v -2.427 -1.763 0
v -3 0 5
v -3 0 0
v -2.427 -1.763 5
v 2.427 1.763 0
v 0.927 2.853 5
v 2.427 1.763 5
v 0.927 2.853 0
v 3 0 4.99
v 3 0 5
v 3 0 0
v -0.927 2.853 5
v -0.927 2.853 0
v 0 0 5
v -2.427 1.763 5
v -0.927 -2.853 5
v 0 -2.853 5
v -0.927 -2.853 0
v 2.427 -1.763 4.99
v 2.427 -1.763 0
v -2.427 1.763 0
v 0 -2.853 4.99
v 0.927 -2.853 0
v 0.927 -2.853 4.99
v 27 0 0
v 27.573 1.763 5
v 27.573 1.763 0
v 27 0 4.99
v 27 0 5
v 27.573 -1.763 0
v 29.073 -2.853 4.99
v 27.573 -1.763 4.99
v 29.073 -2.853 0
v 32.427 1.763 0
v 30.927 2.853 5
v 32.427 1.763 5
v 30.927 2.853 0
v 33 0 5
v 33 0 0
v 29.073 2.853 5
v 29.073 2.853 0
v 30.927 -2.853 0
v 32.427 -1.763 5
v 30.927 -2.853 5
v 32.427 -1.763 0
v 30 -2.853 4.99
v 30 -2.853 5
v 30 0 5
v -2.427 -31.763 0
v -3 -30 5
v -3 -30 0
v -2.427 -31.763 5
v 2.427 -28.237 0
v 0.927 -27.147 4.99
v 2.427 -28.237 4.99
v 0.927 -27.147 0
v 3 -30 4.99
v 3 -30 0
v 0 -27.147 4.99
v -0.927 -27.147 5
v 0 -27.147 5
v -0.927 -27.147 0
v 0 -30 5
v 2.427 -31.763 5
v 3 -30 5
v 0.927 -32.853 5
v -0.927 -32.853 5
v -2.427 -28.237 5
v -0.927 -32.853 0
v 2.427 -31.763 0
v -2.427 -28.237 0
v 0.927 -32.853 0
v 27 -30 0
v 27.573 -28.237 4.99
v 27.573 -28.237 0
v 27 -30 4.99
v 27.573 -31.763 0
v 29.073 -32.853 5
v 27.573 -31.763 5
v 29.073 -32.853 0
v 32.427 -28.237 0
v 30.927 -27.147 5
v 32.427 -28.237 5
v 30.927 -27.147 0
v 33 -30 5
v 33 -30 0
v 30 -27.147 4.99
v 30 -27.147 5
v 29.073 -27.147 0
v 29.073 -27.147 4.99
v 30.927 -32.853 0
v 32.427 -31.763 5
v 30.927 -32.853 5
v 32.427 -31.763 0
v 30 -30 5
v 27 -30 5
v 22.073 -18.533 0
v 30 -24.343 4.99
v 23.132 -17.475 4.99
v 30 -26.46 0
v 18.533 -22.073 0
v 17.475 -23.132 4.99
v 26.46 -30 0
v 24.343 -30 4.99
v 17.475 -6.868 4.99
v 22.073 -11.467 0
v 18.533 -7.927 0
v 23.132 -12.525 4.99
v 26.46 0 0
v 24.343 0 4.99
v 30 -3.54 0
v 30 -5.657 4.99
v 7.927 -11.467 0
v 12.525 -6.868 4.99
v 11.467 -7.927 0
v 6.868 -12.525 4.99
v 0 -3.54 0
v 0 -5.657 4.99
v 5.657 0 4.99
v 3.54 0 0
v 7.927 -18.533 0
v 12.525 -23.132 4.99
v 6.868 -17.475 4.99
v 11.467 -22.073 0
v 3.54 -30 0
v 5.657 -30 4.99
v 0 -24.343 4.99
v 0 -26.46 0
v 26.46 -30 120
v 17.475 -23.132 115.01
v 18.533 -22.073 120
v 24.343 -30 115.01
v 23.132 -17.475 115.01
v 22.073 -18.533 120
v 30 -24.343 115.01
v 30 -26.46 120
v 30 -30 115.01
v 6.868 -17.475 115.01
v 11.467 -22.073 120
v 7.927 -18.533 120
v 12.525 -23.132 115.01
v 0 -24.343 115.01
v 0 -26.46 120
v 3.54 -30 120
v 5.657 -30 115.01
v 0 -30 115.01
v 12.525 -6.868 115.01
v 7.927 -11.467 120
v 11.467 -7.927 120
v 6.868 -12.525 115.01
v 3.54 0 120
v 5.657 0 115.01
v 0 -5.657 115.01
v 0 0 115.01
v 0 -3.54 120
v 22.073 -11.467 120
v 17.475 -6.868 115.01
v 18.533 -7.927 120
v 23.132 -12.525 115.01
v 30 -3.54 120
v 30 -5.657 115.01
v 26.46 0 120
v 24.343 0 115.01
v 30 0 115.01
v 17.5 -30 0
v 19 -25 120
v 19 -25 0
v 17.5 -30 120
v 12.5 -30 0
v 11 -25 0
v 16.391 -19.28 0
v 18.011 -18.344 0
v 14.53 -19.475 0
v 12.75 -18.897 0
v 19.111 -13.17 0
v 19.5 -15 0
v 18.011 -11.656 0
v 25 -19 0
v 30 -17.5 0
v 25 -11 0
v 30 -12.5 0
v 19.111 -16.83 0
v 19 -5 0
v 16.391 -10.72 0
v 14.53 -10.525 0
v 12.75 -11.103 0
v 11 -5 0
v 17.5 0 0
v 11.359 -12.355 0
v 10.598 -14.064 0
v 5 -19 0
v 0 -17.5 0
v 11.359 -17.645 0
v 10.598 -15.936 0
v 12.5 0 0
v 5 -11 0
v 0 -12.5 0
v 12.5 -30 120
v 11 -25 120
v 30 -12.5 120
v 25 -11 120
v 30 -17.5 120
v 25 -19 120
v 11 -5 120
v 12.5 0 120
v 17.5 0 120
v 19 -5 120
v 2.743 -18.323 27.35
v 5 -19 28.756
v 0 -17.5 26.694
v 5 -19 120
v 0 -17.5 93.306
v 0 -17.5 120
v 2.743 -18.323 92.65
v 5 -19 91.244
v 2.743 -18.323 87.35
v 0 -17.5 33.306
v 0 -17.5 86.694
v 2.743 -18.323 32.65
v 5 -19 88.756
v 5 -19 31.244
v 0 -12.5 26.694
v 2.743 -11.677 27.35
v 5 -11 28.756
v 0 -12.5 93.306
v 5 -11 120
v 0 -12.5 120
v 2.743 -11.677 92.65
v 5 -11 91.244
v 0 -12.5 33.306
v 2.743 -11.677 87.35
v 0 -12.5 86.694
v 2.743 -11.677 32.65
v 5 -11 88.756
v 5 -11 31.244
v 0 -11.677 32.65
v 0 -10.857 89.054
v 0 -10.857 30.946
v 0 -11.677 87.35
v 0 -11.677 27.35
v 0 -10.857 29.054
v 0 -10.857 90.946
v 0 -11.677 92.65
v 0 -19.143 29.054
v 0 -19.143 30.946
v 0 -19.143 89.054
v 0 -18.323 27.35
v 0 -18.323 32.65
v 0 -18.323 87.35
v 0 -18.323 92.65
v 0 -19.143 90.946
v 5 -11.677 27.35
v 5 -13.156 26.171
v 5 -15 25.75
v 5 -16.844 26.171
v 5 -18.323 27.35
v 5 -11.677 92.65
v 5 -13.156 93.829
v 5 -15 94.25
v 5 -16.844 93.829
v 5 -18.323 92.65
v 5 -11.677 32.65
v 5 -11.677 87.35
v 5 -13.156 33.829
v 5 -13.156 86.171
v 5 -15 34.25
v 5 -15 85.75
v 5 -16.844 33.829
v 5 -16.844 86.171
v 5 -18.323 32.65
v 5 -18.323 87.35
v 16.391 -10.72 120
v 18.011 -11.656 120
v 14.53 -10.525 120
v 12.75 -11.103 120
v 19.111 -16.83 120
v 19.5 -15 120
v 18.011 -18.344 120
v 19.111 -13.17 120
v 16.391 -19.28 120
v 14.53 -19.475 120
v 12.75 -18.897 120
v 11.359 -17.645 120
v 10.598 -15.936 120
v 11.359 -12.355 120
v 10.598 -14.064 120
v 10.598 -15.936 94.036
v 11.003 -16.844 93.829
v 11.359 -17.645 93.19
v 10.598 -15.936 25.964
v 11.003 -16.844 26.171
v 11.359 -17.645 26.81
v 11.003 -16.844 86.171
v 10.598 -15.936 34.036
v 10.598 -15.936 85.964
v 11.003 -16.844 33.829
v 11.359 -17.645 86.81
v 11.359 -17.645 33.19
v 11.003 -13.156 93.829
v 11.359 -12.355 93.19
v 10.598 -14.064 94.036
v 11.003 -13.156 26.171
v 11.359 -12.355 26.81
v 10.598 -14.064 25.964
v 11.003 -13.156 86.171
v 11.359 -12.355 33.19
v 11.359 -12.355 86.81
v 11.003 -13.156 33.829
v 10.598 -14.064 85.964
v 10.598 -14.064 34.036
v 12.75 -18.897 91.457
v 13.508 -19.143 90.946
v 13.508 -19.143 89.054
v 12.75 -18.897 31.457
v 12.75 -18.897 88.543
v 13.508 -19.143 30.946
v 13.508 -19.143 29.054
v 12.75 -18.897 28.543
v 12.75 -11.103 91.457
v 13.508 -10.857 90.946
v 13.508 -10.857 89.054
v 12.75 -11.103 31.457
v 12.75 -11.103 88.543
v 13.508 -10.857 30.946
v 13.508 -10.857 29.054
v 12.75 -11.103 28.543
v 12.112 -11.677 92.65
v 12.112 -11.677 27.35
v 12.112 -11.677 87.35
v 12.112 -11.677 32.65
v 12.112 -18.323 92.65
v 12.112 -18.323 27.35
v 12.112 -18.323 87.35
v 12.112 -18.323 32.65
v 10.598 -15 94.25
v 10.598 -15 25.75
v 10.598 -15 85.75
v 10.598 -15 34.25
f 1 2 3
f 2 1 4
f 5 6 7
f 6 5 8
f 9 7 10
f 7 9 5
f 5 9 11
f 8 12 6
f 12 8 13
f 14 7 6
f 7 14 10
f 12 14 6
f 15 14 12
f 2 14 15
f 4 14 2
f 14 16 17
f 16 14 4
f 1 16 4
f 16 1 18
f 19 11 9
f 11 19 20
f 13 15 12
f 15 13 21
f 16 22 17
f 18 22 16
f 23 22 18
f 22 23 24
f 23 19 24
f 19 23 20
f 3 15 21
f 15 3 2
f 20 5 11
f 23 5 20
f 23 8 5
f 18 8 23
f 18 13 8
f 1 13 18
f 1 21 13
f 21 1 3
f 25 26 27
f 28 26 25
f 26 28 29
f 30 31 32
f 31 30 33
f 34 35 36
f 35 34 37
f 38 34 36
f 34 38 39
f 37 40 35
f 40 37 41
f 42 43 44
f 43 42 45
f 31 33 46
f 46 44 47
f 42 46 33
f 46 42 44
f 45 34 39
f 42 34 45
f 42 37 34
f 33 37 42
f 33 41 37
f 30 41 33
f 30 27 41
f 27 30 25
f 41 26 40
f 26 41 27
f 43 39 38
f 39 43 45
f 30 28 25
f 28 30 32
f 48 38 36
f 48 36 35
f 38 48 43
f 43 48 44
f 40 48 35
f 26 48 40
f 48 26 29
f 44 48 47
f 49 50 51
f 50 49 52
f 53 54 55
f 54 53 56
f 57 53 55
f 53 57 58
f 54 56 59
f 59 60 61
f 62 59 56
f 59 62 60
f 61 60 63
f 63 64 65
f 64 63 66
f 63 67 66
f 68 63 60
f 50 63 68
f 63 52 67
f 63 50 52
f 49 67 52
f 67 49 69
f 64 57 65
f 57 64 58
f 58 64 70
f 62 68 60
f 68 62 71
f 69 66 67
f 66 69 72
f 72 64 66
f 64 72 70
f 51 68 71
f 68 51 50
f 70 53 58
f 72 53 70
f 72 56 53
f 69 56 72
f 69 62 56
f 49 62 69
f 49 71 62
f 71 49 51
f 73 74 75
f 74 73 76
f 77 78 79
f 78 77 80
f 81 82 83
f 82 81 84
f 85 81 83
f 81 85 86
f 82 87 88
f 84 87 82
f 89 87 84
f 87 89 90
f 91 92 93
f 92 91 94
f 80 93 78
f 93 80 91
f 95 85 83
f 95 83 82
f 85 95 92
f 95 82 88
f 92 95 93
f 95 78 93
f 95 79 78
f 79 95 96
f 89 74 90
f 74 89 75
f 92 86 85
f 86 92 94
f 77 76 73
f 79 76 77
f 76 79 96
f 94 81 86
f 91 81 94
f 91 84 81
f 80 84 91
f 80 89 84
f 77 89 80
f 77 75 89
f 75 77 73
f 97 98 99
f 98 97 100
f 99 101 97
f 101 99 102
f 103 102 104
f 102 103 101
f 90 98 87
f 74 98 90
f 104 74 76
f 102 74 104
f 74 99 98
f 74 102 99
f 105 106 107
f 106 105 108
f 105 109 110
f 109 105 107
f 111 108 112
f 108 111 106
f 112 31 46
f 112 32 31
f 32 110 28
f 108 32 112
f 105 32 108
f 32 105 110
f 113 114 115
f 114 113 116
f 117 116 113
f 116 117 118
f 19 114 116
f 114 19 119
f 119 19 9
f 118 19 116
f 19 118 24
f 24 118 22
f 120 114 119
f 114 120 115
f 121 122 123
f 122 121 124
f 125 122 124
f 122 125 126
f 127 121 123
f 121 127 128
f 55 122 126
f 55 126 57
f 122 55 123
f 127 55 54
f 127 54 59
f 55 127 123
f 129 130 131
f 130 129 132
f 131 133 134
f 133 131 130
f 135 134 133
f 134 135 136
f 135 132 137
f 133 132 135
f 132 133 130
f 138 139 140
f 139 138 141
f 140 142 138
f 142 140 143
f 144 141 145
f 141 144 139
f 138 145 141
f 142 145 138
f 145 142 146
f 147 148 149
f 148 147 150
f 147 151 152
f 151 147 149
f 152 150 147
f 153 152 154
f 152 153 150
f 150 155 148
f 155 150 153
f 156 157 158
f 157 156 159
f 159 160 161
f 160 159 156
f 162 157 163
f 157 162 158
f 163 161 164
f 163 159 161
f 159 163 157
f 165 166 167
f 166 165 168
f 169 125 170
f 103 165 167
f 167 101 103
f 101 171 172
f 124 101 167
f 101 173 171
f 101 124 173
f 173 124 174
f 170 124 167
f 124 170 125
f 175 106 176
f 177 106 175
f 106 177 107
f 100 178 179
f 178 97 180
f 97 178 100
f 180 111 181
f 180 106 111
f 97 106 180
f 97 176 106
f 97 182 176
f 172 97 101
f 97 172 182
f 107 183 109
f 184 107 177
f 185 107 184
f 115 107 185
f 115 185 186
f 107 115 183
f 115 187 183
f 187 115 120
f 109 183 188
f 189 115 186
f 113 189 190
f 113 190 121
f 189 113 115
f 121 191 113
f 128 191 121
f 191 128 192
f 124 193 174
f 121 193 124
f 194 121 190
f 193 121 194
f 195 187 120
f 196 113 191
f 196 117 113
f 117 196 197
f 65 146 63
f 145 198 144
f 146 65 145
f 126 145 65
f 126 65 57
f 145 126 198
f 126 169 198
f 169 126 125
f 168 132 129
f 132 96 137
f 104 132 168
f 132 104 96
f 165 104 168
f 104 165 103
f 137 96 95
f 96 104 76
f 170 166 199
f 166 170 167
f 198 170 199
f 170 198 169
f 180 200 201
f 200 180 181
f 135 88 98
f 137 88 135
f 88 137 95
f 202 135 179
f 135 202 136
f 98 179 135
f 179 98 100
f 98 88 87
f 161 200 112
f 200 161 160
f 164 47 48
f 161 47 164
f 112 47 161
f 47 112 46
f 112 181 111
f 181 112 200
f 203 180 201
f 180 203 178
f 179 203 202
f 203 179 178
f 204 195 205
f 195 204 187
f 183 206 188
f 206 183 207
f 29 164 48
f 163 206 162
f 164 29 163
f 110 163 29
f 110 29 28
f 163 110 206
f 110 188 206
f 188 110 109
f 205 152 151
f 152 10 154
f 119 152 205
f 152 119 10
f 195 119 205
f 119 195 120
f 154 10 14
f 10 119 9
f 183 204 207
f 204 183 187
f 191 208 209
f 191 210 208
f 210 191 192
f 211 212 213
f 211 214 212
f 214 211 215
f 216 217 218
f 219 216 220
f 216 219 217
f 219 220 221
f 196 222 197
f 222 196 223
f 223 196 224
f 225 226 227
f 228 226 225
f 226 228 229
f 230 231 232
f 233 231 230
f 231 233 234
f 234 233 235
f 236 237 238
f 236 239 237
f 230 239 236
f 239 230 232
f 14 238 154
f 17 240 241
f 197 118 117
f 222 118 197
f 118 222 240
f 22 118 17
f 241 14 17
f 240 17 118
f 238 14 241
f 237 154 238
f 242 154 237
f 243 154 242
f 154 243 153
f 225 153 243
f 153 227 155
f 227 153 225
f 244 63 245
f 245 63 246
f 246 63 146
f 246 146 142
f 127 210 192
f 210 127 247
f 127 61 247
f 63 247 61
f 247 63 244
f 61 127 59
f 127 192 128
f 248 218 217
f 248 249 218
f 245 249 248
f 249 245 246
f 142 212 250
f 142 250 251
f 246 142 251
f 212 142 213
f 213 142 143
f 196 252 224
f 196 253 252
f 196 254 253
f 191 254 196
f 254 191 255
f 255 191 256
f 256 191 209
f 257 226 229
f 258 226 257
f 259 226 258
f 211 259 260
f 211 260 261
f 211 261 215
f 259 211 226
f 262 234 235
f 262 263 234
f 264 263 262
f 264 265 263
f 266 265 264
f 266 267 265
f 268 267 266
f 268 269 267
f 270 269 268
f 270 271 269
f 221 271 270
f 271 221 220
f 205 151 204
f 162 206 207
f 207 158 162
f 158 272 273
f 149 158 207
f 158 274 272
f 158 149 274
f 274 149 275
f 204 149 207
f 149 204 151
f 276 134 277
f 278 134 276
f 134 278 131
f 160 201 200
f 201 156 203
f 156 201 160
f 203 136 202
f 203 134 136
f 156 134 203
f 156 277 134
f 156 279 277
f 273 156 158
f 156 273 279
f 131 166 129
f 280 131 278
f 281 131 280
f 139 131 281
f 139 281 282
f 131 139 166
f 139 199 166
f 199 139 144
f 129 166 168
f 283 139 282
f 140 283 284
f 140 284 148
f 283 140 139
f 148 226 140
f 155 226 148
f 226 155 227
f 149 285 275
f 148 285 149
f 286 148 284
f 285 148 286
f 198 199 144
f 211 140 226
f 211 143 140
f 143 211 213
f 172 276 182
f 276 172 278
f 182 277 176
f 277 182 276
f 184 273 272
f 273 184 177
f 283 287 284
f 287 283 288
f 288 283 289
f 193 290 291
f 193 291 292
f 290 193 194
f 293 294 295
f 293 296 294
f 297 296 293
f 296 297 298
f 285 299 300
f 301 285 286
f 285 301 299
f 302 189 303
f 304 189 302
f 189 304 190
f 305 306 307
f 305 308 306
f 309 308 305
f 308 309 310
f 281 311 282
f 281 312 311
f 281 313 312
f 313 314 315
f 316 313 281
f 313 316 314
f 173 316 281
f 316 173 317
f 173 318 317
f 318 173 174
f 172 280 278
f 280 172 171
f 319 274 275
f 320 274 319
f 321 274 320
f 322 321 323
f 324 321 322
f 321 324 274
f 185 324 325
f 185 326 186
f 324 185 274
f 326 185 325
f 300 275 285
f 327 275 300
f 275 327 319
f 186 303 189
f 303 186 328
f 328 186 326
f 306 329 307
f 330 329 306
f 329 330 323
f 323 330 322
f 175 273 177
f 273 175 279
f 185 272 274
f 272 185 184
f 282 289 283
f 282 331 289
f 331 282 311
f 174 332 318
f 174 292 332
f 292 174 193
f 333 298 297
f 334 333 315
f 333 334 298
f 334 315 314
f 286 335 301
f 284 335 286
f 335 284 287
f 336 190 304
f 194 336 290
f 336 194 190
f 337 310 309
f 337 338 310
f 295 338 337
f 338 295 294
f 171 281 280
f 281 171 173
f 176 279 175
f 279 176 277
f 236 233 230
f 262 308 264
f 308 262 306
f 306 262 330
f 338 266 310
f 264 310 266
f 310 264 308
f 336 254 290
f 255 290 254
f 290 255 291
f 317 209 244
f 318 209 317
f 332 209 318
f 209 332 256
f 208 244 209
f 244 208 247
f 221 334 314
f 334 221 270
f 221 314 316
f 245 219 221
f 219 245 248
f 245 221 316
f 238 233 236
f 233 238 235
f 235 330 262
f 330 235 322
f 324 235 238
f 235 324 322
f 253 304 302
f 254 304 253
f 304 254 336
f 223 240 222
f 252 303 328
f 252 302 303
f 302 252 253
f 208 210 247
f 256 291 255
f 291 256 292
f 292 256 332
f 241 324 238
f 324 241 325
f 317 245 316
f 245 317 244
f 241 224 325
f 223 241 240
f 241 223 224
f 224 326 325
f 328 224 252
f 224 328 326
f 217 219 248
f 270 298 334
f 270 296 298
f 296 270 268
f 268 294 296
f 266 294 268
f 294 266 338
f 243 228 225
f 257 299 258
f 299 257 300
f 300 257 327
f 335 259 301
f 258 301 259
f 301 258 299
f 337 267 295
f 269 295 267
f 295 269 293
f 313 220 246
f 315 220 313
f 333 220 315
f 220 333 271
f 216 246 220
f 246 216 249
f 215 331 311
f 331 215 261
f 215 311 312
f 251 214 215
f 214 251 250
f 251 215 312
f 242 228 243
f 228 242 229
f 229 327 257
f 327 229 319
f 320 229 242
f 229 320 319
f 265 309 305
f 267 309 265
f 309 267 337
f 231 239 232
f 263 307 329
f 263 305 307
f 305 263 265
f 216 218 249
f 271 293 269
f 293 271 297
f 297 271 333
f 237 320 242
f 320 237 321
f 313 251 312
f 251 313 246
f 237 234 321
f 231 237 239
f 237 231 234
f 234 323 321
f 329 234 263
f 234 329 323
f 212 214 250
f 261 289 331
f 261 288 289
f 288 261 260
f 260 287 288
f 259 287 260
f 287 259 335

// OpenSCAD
// file: globals.scad
/*
Most things in this file is represented as one millimeter, so keep that in mind while changing things.
Some of the setting are not mm but at variables that you can set, such as 2*x=2x and you are setting what x is.
I will try to specify when things are variables and not exact measurements.
*/

obj_leg = 30;
leg_length = 5.5;
small_number = 0.001;
metal_core_rode_global = 5;


///////////////// number of holes /////////////////////
z_hole_number = 8;
other_holes = 8;

///////////////// Pins /////////////////////

//pins that poke out
ball_size = 10;
pin_height = 20;
pin_diameter = 6;


//holes
hole_ball_size = ball_size;
hole_pin_height = pin_height;
hole_pin_diameter = pin_diameter;

///////////////// Z THINGS /////////////////////

berring_slot_width = 7.5;
berring_slot_depth = 6.5;
metal_core_rode = 5;

///////////////// X THINGS /////////////////////

//male dove tails
max_width=8;
min_width=5;
depth=5;
height=obj_leg/2;

//female dove tails, this is found on the y mounts
girl_max_width=11;
girl_min_width=5;
girl_depth=5;
girl_height=obj_leg;


///////////////// Y THINGS /////////////////////
/*
The Y is so normal that all of those global variables at the top should change all of the setting in it, this section is set her incase there are variables set in the future development of this project.
*/
// file: include.scad
//////////////////      END SECTION       //////////////////

	module added_pins(){
		difference(){
			union(){
				translate([30/(15/4),obj_leg*leg_length,30/(15/4)]) pin();
				translate([30/(15/4)+14.5,obj_leg*leg_length,30/(15/4)+14]) pin();
			}
			union(){
							translate([30/(15/4)+13.5,obj_leg*leg_length-20,30/(15/4)+5])cube(size=[2,40,15]);
							translate([30/(15/4)+7.5,obj_leg*leg_length-20,30/(15/4)+15])rotate([0,90,0]) cube(size=[2,40,15]);	

							translate([30/(15/4)-1,obj_leg*leg_length-20,30/(15/4)-8])cube(size=[2,40,15]);
							translate([30/(15/4)-10,obj_leg*leg_length-20,30/(15/4)+1])rotate([0,90,0]) cube(size=[2,40,15]);
			}
		}
	}
	module taken_pins() {
		translate([30/(15/4)+14,obj_leg*leg_length-10,30/(15/4)]) mirror_pin();
		translate([30/(15/4),obj_leg*leg_length-10,30/(15/4)+15]) mirror_pin();
	}


//////////////////      OTHER STUFF       //////////////////

	module holes() {
		rotate([0,0,90]) for(y=[0:other_holes])
		translate([obj_leg+y*15,-15.5,7.5]) union() {
			translate([7.5,0,15]) hole_up();
			hole_down();
		}
	}
	module extend_holes() {
	module top(){
		rotate([0,0,90]) for(y=[0:other_holes+1])
		translate([(30/4)+y*15,-15.5,7.5]) union() {
			translate([7.5,0,15]) hole_up();
		}
	}
	module bottom(){
		rotate([0,0,90]) for(y=[0:other_holes+2])
		translate([(30/4)+y*15,-15.5,7.5]) union() {
			hole_down();
		
}
	}
	union(){
		top();
		bottom();
	}
	}

	module hole() {
		union() {
			rotate([90, 90, 0]) cylinder(h=40, d=hole_pin_diameter, center=true);
			translate([0,7.5,0]) sphere(d=hole_ball_size);
			translate([0,-6,0]) sphere(d=hole_ball_size);
		}
	}
	module hole_up() {
		union() {
			rotate([90, 90, 0]) cylinder(h=40, d=hole_pin_diameter, center=true);
			translate([0,7.5,10]) cylinder(h=hole_pin_height, d=hole_pin_diameter, center=true);
			translate([0,-6,10]) cylinder(h=hole_pin_height, d=hole_pin_diameter, center=true);
			translate([0,7.5,0]) sphere(d=hole_ball_size);
			translate([0,-6,0]) sphere(d=hole_ball_size);
		}
	}
	module hole_down() {
		union() {
			rotate([90, 90, 0]) cylinder(h=40, d=hole_pin_diameter, center=true);
			translate([0,7.5,-10]) cylinder(h=hole_pin_height, d=hole_pin_diameter, center=true);
			translate([0,-6,-10]) cylinder(h=hole_pin_height, d=hole_pin_diameter, center=true);
			translate([0,7.5,0]) sphere(d=hole_ball_size);
			translate([0,-6,0]) sphere(d=hole_ball_size);
		}
	}
	module pin() {
		union() {
			rotate([90, 90, 0]) cylinder(h=pin_height, d=pin_diameter, center=true);
			translate([0,7.5,0]) sphere(d=ball_size);
		}
	}

	module mirror_pin() {
		rotate([90, 90, 0]) cylinder(h=hole_pin_height+small_number, d=hole_pin_diameter, center=true);
		translate([0,-(pin_height-(ball_size/2)),0]) sphere(d=ball_size);
	}


//////////////////      SOME RACK AND Z THINGS       //////////////////

module z_holes() {
    rotate([0,-90,0]) for(z=[0:z_hole_number])
    translate([22.5+z*15,16,-12])
        hole();
}

module pin_cuts() {
	union(){
		cube(size=[2,10,40], center=true);
		rotate([0,0,90]) cube(size=[2,10,40], center=true);
	}
}
module pin_uncut() {
	union(){
		rotate([0, 0, 90]) cylinder(h=hole_pin_height, d=hole_pin_diameter, center=true);
		translate([0,0,10]) sphere(d=ball_hole);
	}
}


module pin_out() {
	union(){
		rotate([0, 0, 90]) cylinder(h=pin_height, d=pin_diameter, center=true);
		translate([0,0,10]) sphere(d= ball_size);
	}
}


module pins_z(){
	difference() {
		pin_out();
		pin_cuts();
	}
}
//////////////////      RACK AND SLIDE     ///////////////////

module straight_pins() {
	for(z=[0:((((obj_leg*leg_length)*2)-(obj_leg*2))/3)/14.5]) rotate([-90,0,0]) translate([z*15,30/(15/4),14]) pins_z();
	for(z=[0:((((obj_leg*leg_length)*2)-(obj_leg*2))/3)/14.5]) rotate([-90,0,0]) translate([z*15,30/(15/4)-14,14]) pins_z();
}
module stagger_pins() {
	for(z=[0:((((obj_leg*leg_length)*2)-(obj_leg*2))/3)/14.5]) rotate([-90,0,0]) translate([z*15,30/(15/4),14]) pins_z();
	for(z=[0:((((obj_leg*leg_length)*2)-(obj_leg*2))/3)/14.5]) rotate([-90,0,0]) translate([z*15+7,30/(15/4)-14,14]) pins_z();
}


//////////////////      DOVE TAIL       //////////////////

module male_dovetail(height) {
	dovetail_3d(max_width,min_width,depth,height);
}

module dovetail_3d(max_width=11, min_width=5, depth=5, height=30) {
	linear_extrude(height=height, convexity=2)
		dovetail_2d(max_width,min_width,depth);
}

module dovetail_2d(max_width=11, min_width=5, depth=5) {
	angle=atan((max_width/2-min_width/2)/depth);
	echo("angle: ", angle);
	polygon(paths=[[0,1,2,3,0]], points=[[-min_width/2,0], [-max_width/2,depth], [max_width/2, depth], [min_width/2,0]]);
}

//bow tie
	module tie_end(height){
				rotate([0,0,0]) translate([0,-0.01,((obj_leg/2)/2)]) male_dovetail(height);
				rotate([0,90,0]) translate([0,-0.01,((obj_leg/2)/2)]) male_dovetail(height);
				rotate([0,180,0]) translate([0,-0.01,((obj_leg/2)/2)]) male_dovetail(height);
				rotate([0,-90,0]) translate([0,-0.01,((obj_leg/2)/2)]) male_dovetail(height);
	}

module bow_support(){
	difference(){
		intersection(){
			translate([-15,0,-15]) cube([30,9,30]);
			scale([1.05,1.05,1.05]) rotate([0,45,0]) tie_end();
		}
		cube([29.2,29.2,29.2], center=true);
	}
}

	module wrap(units){
	for (y = [-1:units-2]) // two iterations, z = -1, z = 1
	{
			translate([15, (y*30)+15, 15]){
			for (r = [0:4]) // two iterations, z = -1, z = 1
			{
				rotate([0,r*90,0]) translate([0,15,15]) rotate([-90,0,0])male_dovetail(height=30);
			}
		}
	}
	}
// main file
include <include.scad>;
include <globals.scad>;
metal_rod_size = 9;
support = true;
//min number of units is 2
//max is however large your printer can print
units = 4;

module extention(){
	
	module added(){
			translate([0,0,0]) cube([30,30*units,30]);
	}

	module subtracted(){
	translate([15,0,15]) rotate([0,45,0]) tie_end();
	translate([15,units*30,15]) rotate([0,45,0]) rotate([0,0,180]) tie_end();
	translate([15,15,15]) rotate([90,0,0]) cylinder(h=5000, d= metal_rod_size, center=true);

	for (y = [-1:units-2]) // two iterations, z = -1, z = 1
	{
			translate([15, (y*30)+15, 15]){
			for (r = [0:4]) // two iterations, z = -1, z = 1
			{
				rotate([0,r*90,0]) translate([0,15,15]) rotate([-90,0,0])male_dovetail(height=30);
			}
		}
	}

	} //subtracted
	difference(){
		added();
		subtracted();
	}	
} //module extention

//support
if (support==true)
{
	translate([0,0,5/2]) cylinder(h=5, d=6, center=true);
	translate([30,0,5/2]) cylinder(h=5, d=6, center=true);
	translate([0,-30,5/2]) cylinder(h=5, d=6, center=true);
	translate([30,-30,5/2]) cylinder(h=5, d=6, center=true);
}

module extention_finished(){
		rotate([90,0,0]) extention();
}
difference(){
	extention_finished();
	#translate([0,-15,30]) rotate([0,90,0]) cylinder(d=8.5, center=true, h=30);
	#translate([0,-15,30*3]) rotate([0,90,0]) cylinder(d=8.5, center=true, h=30);
}
